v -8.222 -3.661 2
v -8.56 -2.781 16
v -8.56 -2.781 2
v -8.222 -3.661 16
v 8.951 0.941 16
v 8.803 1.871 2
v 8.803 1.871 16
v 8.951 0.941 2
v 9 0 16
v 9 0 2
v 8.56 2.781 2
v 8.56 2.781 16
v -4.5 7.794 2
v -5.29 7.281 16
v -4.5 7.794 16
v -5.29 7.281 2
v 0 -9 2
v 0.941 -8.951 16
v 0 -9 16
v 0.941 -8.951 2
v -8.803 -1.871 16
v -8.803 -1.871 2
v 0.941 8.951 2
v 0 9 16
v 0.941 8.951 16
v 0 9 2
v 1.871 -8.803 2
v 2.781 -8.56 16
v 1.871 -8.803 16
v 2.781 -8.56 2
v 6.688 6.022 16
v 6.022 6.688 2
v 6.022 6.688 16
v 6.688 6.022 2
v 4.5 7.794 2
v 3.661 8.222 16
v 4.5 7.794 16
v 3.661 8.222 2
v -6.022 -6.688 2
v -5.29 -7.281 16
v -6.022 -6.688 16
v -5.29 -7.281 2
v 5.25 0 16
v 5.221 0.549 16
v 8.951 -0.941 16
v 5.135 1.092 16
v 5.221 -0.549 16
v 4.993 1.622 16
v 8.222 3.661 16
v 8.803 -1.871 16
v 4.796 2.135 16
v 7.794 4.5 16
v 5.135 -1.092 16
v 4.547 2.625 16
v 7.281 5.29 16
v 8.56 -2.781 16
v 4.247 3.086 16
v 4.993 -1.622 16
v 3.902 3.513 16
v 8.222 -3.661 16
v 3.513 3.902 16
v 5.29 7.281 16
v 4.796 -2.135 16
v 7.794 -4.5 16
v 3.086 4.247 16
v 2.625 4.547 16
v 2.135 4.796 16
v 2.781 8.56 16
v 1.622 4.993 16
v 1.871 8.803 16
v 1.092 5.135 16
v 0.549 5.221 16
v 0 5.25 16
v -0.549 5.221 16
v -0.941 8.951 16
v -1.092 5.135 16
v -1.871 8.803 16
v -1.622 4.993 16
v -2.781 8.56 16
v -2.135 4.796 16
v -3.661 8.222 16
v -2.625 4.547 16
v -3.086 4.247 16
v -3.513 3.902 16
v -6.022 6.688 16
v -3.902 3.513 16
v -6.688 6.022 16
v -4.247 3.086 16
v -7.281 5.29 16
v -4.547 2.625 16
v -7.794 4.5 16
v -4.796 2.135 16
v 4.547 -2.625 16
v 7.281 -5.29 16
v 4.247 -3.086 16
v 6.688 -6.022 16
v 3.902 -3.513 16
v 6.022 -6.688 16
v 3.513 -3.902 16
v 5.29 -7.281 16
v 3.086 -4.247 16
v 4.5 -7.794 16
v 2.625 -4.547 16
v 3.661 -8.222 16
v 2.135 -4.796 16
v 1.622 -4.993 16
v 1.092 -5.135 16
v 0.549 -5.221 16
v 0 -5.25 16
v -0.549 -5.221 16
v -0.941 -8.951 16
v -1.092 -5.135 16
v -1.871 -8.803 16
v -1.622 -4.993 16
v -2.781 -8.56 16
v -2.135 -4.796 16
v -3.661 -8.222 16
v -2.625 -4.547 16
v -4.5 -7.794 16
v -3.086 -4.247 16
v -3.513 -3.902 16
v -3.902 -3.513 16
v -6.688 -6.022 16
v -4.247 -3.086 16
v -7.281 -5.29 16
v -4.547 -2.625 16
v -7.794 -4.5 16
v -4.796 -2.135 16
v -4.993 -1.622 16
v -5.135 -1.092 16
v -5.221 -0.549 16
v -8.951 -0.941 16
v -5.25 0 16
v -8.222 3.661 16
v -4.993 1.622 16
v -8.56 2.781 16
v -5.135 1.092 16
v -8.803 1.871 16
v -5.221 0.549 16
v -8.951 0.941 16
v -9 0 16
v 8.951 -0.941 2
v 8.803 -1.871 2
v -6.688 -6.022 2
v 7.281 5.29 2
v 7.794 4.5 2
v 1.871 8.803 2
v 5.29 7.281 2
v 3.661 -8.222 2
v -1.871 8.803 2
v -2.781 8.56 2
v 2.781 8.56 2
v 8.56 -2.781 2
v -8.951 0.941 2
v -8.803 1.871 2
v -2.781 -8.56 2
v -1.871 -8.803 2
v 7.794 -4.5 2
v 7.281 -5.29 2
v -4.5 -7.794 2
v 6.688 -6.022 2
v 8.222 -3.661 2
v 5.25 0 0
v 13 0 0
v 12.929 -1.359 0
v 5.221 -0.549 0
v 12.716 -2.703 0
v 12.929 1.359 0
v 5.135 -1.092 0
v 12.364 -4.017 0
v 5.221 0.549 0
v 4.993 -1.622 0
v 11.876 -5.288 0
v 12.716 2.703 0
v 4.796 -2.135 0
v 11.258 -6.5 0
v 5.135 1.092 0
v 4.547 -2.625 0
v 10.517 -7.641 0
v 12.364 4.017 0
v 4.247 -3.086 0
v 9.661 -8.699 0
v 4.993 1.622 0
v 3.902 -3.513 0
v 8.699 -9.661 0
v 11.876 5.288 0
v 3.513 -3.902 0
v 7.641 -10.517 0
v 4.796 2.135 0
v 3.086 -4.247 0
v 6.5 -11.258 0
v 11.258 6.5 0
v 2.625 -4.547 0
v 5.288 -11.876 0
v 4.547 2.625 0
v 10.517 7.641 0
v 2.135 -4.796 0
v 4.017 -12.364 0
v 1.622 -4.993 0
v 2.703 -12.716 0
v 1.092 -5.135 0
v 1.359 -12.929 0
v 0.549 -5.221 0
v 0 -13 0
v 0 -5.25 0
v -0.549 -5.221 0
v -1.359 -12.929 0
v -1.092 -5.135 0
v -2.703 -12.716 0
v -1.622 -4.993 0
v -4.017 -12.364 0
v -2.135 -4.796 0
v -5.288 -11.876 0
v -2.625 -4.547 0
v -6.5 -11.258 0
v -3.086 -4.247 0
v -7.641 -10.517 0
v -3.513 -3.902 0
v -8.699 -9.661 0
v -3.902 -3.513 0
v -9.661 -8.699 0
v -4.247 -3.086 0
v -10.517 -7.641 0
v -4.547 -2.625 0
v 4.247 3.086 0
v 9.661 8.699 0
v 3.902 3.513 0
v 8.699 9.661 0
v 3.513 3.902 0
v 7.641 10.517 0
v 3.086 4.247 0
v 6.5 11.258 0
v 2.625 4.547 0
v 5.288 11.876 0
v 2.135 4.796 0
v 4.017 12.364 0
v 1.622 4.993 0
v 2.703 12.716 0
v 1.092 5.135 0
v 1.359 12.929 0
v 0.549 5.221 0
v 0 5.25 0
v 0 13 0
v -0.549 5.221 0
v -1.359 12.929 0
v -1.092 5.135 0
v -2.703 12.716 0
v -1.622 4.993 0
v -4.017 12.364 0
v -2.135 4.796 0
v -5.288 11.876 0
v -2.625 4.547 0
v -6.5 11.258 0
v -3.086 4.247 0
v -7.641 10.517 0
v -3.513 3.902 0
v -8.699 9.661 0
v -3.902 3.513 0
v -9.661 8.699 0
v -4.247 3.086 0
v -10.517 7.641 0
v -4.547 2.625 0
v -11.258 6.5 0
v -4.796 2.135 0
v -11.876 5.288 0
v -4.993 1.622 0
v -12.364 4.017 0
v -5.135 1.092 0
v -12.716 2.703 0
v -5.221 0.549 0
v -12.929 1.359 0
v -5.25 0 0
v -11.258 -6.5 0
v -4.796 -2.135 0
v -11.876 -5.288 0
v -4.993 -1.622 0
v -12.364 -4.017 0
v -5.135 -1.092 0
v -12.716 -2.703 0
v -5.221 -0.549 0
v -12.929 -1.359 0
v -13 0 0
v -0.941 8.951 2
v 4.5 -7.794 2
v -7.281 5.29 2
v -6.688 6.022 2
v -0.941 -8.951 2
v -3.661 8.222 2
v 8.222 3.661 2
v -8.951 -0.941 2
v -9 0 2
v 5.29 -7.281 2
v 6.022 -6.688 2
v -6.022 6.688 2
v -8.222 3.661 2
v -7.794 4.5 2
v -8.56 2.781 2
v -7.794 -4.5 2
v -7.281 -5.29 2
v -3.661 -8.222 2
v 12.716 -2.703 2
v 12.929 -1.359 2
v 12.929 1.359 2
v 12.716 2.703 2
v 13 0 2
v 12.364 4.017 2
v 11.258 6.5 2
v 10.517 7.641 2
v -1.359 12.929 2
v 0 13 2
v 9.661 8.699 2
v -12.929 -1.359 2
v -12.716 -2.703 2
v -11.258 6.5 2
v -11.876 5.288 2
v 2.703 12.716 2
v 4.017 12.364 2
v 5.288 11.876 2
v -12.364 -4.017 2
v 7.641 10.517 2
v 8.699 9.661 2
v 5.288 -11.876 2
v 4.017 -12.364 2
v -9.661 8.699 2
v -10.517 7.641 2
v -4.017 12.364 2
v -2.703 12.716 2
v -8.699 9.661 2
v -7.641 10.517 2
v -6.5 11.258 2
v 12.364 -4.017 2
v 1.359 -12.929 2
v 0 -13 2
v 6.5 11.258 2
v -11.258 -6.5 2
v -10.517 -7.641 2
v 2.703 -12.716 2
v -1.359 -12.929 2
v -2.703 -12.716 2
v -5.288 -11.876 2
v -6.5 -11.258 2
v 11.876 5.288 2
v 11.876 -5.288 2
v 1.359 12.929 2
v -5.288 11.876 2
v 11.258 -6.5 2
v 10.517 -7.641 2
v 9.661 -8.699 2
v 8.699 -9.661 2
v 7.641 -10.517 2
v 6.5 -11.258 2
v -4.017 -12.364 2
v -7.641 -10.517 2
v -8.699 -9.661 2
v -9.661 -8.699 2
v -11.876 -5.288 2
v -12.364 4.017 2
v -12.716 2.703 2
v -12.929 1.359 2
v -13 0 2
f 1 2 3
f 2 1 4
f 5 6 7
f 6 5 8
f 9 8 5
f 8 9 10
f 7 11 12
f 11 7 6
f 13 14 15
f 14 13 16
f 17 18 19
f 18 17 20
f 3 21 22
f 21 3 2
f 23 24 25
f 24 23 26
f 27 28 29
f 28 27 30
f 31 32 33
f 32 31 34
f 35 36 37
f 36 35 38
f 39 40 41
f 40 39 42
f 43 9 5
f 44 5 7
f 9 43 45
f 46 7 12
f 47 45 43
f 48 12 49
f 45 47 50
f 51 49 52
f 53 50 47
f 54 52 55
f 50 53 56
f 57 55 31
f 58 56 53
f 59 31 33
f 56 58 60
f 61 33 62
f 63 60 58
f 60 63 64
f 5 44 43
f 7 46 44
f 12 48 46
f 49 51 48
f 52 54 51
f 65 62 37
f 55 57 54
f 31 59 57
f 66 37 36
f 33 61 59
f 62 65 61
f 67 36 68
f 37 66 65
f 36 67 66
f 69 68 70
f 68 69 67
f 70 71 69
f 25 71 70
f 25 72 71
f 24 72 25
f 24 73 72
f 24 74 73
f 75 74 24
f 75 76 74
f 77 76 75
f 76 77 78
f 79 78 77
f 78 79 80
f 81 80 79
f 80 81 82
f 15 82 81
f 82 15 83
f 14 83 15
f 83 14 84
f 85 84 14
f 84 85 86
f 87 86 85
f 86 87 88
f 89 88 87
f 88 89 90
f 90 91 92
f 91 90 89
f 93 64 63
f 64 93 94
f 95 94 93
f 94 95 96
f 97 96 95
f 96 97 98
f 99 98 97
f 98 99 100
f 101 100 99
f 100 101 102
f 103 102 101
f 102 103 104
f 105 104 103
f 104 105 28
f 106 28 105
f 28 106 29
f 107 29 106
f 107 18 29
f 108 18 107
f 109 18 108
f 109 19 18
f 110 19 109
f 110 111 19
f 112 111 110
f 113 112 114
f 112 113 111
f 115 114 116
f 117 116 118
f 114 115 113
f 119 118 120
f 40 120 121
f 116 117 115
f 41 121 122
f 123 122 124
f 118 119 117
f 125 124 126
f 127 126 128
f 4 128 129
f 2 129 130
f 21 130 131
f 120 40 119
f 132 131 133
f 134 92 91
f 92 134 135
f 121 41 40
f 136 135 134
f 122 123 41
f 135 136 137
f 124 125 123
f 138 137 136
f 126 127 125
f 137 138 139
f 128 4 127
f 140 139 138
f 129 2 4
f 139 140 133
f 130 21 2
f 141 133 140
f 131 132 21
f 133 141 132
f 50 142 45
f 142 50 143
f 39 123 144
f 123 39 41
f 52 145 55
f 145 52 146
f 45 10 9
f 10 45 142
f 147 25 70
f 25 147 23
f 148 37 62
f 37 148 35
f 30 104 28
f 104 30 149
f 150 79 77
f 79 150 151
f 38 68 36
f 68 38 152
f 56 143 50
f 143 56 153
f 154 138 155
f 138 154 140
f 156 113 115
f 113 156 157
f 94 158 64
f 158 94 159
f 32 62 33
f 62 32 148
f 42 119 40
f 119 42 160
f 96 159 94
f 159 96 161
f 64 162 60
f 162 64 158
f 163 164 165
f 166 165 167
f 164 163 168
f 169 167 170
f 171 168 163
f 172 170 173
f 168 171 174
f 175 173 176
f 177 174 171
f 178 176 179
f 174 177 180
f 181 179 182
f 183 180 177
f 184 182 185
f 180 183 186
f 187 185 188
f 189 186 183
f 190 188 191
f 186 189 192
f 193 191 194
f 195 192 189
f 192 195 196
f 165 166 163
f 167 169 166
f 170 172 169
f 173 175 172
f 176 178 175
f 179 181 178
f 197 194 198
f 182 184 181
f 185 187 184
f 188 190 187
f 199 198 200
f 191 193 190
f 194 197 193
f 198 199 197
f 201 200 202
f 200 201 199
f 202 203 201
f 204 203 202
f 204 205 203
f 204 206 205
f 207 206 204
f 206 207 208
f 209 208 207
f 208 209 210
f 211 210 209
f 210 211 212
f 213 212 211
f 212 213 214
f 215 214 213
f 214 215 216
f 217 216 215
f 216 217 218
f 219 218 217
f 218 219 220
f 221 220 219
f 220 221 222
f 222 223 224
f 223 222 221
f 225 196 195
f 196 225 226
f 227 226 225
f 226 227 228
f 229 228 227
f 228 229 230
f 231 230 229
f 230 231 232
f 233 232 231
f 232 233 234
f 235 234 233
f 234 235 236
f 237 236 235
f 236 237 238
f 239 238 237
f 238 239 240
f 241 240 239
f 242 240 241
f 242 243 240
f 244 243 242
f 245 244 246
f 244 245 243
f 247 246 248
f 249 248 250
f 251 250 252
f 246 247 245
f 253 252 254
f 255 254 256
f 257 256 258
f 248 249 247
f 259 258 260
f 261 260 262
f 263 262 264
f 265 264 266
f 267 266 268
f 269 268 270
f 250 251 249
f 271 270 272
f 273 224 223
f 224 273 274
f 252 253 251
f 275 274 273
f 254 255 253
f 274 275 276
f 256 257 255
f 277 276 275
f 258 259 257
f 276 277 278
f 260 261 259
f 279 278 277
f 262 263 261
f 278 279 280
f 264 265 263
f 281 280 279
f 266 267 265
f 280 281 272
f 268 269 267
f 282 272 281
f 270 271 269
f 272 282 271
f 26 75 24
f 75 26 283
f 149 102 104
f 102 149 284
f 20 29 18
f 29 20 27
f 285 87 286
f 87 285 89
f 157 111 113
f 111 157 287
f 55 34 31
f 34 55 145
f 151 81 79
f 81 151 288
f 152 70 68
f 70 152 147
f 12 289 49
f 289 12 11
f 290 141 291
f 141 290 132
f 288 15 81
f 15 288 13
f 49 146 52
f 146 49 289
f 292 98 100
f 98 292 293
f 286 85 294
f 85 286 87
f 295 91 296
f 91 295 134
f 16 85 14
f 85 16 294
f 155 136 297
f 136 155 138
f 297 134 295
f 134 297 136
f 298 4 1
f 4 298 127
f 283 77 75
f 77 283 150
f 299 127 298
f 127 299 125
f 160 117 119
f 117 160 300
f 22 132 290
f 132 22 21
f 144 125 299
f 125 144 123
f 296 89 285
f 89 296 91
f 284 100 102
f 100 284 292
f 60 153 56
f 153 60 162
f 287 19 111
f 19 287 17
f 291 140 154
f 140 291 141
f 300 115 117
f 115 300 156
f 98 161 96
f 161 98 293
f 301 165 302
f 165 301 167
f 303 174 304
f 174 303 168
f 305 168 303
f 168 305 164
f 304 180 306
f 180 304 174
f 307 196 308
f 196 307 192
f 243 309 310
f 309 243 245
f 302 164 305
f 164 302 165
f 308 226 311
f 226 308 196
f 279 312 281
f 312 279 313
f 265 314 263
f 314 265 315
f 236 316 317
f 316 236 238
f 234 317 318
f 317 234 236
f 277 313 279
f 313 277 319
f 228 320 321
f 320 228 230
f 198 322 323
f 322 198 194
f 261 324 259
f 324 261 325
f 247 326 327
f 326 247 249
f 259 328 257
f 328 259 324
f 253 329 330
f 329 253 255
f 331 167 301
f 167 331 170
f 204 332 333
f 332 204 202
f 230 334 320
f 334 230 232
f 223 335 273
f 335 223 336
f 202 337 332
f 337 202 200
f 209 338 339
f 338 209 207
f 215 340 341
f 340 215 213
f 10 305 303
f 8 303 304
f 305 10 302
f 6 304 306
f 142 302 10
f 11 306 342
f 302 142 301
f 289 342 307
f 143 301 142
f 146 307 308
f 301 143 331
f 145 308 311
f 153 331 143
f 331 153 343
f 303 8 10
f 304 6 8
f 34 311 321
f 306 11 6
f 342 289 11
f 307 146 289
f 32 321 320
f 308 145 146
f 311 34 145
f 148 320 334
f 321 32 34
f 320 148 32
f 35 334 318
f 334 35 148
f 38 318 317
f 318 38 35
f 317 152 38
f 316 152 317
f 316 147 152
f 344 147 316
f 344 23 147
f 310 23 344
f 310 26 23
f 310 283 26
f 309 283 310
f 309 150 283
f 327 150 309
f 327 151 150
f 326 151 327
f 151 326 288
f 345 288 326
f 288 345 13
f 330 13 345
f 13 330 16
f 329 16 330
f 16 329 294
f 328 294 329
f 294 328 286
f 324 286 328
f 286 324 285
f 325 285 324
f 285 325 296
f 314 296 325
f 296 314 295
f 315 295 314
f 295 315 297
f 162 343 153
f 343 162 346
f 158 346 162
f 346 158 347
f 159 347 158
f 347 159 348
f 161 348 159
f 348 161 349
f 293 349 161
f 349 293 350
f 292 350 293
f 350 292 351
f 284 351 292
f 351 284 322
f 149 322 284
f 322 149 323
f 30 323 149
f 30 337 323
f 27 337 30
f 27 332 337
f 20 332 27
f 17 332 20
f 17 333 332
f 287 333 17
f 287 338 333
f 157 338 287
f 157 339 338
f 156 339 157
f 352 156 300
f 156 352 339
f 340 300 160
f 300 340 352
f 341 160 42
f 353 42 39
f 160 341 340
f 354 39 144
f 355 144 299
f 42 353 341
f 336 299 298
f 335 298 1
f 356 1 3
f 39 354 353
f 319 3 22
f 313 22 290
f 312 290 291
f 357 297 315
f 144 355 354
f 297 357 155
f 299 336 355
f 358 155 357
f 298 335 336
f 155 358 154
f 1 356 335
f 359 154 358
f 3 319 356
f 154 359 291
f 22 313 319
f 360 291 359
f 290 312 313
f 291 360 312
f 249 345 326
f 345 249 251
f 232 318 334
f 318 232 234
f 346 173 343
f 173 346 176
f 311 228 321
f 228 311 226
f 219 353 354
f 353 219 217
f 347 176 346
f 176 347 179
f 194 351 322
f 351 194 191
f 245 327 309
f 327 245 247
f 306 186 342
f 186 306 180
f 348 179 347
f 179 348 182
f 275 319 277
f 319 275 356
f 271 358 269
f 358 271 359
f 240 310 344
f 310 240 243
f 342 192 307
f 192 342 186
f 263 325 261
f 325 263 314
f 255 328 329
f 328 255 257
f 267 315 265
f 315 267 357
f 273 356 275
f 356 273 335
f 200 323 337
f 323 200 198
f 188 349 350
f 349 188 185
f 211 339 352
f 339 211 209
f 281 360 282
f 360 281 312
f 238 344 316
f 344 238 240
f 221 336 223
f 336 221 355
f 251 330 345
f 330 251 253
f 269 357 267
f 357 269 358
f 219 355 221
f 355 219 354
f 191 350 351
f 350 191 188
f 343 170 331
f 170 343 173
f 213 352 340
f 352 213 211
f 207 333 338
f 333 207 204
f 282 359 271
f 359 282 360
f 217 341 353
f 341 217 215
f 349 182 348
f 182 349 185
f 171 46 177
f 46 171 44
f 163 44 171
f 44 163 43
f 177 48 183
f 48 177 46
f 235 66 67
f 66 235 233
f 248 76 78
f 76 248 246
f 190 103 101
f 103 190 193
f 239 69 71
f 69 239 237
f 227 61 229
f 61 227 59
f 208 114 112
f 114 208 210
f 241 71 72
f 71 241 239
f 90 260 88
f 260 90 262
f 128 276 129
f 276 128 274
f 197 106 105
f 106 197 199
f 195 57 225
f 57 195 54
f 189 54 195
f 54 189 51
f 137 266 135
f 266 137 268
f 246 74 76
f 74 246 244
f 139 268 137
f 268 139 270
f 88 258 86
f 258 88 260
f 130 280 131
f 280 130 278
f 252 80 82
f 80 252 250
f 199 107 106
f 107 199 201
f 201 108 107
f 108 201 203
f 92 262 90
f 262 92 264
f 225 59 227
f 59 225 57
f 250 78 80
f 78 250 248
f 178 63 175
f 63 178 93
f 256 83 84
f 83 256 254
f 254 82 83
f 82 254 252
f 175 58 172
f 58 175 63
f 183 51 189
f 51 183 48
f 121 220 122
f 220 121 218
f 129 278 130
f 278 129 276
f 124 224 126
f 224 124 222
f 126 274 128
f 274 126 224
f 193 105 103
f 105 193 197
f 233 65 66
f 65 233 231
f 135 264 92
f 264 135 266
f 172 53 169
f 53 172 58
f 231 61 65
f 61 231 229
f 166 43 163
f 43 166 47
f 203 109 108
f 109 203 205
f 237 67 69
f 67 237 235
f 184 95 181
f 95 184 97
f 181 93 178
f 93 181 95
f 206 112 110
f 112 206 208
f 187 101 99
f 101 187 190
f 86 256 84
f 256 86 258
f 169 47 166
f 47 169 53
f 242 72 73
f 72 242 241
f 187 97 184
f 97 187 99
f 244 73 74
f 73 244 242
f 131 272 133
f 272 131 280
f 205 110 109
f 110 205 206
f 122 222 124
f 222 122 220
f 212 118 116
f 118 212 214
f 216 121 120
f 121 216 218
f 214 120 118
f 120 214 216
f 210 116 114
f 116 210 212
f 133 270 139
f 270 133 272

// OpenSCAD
// Rivet nut / nutsert.
$fn = 60;
eps = 0.02;
thread_d = 10.5;
outer_d = 18;
length = 16;
flange_d = 26;
difference() { union() { cylinder(d=max(outer_d, thread_d+3),h=length); cylinder(d=max(flange_d, thread_d+6),h=2); } translate([0,0,-eps]) cylinder(d=thread_d,h=length+2*eps); }
